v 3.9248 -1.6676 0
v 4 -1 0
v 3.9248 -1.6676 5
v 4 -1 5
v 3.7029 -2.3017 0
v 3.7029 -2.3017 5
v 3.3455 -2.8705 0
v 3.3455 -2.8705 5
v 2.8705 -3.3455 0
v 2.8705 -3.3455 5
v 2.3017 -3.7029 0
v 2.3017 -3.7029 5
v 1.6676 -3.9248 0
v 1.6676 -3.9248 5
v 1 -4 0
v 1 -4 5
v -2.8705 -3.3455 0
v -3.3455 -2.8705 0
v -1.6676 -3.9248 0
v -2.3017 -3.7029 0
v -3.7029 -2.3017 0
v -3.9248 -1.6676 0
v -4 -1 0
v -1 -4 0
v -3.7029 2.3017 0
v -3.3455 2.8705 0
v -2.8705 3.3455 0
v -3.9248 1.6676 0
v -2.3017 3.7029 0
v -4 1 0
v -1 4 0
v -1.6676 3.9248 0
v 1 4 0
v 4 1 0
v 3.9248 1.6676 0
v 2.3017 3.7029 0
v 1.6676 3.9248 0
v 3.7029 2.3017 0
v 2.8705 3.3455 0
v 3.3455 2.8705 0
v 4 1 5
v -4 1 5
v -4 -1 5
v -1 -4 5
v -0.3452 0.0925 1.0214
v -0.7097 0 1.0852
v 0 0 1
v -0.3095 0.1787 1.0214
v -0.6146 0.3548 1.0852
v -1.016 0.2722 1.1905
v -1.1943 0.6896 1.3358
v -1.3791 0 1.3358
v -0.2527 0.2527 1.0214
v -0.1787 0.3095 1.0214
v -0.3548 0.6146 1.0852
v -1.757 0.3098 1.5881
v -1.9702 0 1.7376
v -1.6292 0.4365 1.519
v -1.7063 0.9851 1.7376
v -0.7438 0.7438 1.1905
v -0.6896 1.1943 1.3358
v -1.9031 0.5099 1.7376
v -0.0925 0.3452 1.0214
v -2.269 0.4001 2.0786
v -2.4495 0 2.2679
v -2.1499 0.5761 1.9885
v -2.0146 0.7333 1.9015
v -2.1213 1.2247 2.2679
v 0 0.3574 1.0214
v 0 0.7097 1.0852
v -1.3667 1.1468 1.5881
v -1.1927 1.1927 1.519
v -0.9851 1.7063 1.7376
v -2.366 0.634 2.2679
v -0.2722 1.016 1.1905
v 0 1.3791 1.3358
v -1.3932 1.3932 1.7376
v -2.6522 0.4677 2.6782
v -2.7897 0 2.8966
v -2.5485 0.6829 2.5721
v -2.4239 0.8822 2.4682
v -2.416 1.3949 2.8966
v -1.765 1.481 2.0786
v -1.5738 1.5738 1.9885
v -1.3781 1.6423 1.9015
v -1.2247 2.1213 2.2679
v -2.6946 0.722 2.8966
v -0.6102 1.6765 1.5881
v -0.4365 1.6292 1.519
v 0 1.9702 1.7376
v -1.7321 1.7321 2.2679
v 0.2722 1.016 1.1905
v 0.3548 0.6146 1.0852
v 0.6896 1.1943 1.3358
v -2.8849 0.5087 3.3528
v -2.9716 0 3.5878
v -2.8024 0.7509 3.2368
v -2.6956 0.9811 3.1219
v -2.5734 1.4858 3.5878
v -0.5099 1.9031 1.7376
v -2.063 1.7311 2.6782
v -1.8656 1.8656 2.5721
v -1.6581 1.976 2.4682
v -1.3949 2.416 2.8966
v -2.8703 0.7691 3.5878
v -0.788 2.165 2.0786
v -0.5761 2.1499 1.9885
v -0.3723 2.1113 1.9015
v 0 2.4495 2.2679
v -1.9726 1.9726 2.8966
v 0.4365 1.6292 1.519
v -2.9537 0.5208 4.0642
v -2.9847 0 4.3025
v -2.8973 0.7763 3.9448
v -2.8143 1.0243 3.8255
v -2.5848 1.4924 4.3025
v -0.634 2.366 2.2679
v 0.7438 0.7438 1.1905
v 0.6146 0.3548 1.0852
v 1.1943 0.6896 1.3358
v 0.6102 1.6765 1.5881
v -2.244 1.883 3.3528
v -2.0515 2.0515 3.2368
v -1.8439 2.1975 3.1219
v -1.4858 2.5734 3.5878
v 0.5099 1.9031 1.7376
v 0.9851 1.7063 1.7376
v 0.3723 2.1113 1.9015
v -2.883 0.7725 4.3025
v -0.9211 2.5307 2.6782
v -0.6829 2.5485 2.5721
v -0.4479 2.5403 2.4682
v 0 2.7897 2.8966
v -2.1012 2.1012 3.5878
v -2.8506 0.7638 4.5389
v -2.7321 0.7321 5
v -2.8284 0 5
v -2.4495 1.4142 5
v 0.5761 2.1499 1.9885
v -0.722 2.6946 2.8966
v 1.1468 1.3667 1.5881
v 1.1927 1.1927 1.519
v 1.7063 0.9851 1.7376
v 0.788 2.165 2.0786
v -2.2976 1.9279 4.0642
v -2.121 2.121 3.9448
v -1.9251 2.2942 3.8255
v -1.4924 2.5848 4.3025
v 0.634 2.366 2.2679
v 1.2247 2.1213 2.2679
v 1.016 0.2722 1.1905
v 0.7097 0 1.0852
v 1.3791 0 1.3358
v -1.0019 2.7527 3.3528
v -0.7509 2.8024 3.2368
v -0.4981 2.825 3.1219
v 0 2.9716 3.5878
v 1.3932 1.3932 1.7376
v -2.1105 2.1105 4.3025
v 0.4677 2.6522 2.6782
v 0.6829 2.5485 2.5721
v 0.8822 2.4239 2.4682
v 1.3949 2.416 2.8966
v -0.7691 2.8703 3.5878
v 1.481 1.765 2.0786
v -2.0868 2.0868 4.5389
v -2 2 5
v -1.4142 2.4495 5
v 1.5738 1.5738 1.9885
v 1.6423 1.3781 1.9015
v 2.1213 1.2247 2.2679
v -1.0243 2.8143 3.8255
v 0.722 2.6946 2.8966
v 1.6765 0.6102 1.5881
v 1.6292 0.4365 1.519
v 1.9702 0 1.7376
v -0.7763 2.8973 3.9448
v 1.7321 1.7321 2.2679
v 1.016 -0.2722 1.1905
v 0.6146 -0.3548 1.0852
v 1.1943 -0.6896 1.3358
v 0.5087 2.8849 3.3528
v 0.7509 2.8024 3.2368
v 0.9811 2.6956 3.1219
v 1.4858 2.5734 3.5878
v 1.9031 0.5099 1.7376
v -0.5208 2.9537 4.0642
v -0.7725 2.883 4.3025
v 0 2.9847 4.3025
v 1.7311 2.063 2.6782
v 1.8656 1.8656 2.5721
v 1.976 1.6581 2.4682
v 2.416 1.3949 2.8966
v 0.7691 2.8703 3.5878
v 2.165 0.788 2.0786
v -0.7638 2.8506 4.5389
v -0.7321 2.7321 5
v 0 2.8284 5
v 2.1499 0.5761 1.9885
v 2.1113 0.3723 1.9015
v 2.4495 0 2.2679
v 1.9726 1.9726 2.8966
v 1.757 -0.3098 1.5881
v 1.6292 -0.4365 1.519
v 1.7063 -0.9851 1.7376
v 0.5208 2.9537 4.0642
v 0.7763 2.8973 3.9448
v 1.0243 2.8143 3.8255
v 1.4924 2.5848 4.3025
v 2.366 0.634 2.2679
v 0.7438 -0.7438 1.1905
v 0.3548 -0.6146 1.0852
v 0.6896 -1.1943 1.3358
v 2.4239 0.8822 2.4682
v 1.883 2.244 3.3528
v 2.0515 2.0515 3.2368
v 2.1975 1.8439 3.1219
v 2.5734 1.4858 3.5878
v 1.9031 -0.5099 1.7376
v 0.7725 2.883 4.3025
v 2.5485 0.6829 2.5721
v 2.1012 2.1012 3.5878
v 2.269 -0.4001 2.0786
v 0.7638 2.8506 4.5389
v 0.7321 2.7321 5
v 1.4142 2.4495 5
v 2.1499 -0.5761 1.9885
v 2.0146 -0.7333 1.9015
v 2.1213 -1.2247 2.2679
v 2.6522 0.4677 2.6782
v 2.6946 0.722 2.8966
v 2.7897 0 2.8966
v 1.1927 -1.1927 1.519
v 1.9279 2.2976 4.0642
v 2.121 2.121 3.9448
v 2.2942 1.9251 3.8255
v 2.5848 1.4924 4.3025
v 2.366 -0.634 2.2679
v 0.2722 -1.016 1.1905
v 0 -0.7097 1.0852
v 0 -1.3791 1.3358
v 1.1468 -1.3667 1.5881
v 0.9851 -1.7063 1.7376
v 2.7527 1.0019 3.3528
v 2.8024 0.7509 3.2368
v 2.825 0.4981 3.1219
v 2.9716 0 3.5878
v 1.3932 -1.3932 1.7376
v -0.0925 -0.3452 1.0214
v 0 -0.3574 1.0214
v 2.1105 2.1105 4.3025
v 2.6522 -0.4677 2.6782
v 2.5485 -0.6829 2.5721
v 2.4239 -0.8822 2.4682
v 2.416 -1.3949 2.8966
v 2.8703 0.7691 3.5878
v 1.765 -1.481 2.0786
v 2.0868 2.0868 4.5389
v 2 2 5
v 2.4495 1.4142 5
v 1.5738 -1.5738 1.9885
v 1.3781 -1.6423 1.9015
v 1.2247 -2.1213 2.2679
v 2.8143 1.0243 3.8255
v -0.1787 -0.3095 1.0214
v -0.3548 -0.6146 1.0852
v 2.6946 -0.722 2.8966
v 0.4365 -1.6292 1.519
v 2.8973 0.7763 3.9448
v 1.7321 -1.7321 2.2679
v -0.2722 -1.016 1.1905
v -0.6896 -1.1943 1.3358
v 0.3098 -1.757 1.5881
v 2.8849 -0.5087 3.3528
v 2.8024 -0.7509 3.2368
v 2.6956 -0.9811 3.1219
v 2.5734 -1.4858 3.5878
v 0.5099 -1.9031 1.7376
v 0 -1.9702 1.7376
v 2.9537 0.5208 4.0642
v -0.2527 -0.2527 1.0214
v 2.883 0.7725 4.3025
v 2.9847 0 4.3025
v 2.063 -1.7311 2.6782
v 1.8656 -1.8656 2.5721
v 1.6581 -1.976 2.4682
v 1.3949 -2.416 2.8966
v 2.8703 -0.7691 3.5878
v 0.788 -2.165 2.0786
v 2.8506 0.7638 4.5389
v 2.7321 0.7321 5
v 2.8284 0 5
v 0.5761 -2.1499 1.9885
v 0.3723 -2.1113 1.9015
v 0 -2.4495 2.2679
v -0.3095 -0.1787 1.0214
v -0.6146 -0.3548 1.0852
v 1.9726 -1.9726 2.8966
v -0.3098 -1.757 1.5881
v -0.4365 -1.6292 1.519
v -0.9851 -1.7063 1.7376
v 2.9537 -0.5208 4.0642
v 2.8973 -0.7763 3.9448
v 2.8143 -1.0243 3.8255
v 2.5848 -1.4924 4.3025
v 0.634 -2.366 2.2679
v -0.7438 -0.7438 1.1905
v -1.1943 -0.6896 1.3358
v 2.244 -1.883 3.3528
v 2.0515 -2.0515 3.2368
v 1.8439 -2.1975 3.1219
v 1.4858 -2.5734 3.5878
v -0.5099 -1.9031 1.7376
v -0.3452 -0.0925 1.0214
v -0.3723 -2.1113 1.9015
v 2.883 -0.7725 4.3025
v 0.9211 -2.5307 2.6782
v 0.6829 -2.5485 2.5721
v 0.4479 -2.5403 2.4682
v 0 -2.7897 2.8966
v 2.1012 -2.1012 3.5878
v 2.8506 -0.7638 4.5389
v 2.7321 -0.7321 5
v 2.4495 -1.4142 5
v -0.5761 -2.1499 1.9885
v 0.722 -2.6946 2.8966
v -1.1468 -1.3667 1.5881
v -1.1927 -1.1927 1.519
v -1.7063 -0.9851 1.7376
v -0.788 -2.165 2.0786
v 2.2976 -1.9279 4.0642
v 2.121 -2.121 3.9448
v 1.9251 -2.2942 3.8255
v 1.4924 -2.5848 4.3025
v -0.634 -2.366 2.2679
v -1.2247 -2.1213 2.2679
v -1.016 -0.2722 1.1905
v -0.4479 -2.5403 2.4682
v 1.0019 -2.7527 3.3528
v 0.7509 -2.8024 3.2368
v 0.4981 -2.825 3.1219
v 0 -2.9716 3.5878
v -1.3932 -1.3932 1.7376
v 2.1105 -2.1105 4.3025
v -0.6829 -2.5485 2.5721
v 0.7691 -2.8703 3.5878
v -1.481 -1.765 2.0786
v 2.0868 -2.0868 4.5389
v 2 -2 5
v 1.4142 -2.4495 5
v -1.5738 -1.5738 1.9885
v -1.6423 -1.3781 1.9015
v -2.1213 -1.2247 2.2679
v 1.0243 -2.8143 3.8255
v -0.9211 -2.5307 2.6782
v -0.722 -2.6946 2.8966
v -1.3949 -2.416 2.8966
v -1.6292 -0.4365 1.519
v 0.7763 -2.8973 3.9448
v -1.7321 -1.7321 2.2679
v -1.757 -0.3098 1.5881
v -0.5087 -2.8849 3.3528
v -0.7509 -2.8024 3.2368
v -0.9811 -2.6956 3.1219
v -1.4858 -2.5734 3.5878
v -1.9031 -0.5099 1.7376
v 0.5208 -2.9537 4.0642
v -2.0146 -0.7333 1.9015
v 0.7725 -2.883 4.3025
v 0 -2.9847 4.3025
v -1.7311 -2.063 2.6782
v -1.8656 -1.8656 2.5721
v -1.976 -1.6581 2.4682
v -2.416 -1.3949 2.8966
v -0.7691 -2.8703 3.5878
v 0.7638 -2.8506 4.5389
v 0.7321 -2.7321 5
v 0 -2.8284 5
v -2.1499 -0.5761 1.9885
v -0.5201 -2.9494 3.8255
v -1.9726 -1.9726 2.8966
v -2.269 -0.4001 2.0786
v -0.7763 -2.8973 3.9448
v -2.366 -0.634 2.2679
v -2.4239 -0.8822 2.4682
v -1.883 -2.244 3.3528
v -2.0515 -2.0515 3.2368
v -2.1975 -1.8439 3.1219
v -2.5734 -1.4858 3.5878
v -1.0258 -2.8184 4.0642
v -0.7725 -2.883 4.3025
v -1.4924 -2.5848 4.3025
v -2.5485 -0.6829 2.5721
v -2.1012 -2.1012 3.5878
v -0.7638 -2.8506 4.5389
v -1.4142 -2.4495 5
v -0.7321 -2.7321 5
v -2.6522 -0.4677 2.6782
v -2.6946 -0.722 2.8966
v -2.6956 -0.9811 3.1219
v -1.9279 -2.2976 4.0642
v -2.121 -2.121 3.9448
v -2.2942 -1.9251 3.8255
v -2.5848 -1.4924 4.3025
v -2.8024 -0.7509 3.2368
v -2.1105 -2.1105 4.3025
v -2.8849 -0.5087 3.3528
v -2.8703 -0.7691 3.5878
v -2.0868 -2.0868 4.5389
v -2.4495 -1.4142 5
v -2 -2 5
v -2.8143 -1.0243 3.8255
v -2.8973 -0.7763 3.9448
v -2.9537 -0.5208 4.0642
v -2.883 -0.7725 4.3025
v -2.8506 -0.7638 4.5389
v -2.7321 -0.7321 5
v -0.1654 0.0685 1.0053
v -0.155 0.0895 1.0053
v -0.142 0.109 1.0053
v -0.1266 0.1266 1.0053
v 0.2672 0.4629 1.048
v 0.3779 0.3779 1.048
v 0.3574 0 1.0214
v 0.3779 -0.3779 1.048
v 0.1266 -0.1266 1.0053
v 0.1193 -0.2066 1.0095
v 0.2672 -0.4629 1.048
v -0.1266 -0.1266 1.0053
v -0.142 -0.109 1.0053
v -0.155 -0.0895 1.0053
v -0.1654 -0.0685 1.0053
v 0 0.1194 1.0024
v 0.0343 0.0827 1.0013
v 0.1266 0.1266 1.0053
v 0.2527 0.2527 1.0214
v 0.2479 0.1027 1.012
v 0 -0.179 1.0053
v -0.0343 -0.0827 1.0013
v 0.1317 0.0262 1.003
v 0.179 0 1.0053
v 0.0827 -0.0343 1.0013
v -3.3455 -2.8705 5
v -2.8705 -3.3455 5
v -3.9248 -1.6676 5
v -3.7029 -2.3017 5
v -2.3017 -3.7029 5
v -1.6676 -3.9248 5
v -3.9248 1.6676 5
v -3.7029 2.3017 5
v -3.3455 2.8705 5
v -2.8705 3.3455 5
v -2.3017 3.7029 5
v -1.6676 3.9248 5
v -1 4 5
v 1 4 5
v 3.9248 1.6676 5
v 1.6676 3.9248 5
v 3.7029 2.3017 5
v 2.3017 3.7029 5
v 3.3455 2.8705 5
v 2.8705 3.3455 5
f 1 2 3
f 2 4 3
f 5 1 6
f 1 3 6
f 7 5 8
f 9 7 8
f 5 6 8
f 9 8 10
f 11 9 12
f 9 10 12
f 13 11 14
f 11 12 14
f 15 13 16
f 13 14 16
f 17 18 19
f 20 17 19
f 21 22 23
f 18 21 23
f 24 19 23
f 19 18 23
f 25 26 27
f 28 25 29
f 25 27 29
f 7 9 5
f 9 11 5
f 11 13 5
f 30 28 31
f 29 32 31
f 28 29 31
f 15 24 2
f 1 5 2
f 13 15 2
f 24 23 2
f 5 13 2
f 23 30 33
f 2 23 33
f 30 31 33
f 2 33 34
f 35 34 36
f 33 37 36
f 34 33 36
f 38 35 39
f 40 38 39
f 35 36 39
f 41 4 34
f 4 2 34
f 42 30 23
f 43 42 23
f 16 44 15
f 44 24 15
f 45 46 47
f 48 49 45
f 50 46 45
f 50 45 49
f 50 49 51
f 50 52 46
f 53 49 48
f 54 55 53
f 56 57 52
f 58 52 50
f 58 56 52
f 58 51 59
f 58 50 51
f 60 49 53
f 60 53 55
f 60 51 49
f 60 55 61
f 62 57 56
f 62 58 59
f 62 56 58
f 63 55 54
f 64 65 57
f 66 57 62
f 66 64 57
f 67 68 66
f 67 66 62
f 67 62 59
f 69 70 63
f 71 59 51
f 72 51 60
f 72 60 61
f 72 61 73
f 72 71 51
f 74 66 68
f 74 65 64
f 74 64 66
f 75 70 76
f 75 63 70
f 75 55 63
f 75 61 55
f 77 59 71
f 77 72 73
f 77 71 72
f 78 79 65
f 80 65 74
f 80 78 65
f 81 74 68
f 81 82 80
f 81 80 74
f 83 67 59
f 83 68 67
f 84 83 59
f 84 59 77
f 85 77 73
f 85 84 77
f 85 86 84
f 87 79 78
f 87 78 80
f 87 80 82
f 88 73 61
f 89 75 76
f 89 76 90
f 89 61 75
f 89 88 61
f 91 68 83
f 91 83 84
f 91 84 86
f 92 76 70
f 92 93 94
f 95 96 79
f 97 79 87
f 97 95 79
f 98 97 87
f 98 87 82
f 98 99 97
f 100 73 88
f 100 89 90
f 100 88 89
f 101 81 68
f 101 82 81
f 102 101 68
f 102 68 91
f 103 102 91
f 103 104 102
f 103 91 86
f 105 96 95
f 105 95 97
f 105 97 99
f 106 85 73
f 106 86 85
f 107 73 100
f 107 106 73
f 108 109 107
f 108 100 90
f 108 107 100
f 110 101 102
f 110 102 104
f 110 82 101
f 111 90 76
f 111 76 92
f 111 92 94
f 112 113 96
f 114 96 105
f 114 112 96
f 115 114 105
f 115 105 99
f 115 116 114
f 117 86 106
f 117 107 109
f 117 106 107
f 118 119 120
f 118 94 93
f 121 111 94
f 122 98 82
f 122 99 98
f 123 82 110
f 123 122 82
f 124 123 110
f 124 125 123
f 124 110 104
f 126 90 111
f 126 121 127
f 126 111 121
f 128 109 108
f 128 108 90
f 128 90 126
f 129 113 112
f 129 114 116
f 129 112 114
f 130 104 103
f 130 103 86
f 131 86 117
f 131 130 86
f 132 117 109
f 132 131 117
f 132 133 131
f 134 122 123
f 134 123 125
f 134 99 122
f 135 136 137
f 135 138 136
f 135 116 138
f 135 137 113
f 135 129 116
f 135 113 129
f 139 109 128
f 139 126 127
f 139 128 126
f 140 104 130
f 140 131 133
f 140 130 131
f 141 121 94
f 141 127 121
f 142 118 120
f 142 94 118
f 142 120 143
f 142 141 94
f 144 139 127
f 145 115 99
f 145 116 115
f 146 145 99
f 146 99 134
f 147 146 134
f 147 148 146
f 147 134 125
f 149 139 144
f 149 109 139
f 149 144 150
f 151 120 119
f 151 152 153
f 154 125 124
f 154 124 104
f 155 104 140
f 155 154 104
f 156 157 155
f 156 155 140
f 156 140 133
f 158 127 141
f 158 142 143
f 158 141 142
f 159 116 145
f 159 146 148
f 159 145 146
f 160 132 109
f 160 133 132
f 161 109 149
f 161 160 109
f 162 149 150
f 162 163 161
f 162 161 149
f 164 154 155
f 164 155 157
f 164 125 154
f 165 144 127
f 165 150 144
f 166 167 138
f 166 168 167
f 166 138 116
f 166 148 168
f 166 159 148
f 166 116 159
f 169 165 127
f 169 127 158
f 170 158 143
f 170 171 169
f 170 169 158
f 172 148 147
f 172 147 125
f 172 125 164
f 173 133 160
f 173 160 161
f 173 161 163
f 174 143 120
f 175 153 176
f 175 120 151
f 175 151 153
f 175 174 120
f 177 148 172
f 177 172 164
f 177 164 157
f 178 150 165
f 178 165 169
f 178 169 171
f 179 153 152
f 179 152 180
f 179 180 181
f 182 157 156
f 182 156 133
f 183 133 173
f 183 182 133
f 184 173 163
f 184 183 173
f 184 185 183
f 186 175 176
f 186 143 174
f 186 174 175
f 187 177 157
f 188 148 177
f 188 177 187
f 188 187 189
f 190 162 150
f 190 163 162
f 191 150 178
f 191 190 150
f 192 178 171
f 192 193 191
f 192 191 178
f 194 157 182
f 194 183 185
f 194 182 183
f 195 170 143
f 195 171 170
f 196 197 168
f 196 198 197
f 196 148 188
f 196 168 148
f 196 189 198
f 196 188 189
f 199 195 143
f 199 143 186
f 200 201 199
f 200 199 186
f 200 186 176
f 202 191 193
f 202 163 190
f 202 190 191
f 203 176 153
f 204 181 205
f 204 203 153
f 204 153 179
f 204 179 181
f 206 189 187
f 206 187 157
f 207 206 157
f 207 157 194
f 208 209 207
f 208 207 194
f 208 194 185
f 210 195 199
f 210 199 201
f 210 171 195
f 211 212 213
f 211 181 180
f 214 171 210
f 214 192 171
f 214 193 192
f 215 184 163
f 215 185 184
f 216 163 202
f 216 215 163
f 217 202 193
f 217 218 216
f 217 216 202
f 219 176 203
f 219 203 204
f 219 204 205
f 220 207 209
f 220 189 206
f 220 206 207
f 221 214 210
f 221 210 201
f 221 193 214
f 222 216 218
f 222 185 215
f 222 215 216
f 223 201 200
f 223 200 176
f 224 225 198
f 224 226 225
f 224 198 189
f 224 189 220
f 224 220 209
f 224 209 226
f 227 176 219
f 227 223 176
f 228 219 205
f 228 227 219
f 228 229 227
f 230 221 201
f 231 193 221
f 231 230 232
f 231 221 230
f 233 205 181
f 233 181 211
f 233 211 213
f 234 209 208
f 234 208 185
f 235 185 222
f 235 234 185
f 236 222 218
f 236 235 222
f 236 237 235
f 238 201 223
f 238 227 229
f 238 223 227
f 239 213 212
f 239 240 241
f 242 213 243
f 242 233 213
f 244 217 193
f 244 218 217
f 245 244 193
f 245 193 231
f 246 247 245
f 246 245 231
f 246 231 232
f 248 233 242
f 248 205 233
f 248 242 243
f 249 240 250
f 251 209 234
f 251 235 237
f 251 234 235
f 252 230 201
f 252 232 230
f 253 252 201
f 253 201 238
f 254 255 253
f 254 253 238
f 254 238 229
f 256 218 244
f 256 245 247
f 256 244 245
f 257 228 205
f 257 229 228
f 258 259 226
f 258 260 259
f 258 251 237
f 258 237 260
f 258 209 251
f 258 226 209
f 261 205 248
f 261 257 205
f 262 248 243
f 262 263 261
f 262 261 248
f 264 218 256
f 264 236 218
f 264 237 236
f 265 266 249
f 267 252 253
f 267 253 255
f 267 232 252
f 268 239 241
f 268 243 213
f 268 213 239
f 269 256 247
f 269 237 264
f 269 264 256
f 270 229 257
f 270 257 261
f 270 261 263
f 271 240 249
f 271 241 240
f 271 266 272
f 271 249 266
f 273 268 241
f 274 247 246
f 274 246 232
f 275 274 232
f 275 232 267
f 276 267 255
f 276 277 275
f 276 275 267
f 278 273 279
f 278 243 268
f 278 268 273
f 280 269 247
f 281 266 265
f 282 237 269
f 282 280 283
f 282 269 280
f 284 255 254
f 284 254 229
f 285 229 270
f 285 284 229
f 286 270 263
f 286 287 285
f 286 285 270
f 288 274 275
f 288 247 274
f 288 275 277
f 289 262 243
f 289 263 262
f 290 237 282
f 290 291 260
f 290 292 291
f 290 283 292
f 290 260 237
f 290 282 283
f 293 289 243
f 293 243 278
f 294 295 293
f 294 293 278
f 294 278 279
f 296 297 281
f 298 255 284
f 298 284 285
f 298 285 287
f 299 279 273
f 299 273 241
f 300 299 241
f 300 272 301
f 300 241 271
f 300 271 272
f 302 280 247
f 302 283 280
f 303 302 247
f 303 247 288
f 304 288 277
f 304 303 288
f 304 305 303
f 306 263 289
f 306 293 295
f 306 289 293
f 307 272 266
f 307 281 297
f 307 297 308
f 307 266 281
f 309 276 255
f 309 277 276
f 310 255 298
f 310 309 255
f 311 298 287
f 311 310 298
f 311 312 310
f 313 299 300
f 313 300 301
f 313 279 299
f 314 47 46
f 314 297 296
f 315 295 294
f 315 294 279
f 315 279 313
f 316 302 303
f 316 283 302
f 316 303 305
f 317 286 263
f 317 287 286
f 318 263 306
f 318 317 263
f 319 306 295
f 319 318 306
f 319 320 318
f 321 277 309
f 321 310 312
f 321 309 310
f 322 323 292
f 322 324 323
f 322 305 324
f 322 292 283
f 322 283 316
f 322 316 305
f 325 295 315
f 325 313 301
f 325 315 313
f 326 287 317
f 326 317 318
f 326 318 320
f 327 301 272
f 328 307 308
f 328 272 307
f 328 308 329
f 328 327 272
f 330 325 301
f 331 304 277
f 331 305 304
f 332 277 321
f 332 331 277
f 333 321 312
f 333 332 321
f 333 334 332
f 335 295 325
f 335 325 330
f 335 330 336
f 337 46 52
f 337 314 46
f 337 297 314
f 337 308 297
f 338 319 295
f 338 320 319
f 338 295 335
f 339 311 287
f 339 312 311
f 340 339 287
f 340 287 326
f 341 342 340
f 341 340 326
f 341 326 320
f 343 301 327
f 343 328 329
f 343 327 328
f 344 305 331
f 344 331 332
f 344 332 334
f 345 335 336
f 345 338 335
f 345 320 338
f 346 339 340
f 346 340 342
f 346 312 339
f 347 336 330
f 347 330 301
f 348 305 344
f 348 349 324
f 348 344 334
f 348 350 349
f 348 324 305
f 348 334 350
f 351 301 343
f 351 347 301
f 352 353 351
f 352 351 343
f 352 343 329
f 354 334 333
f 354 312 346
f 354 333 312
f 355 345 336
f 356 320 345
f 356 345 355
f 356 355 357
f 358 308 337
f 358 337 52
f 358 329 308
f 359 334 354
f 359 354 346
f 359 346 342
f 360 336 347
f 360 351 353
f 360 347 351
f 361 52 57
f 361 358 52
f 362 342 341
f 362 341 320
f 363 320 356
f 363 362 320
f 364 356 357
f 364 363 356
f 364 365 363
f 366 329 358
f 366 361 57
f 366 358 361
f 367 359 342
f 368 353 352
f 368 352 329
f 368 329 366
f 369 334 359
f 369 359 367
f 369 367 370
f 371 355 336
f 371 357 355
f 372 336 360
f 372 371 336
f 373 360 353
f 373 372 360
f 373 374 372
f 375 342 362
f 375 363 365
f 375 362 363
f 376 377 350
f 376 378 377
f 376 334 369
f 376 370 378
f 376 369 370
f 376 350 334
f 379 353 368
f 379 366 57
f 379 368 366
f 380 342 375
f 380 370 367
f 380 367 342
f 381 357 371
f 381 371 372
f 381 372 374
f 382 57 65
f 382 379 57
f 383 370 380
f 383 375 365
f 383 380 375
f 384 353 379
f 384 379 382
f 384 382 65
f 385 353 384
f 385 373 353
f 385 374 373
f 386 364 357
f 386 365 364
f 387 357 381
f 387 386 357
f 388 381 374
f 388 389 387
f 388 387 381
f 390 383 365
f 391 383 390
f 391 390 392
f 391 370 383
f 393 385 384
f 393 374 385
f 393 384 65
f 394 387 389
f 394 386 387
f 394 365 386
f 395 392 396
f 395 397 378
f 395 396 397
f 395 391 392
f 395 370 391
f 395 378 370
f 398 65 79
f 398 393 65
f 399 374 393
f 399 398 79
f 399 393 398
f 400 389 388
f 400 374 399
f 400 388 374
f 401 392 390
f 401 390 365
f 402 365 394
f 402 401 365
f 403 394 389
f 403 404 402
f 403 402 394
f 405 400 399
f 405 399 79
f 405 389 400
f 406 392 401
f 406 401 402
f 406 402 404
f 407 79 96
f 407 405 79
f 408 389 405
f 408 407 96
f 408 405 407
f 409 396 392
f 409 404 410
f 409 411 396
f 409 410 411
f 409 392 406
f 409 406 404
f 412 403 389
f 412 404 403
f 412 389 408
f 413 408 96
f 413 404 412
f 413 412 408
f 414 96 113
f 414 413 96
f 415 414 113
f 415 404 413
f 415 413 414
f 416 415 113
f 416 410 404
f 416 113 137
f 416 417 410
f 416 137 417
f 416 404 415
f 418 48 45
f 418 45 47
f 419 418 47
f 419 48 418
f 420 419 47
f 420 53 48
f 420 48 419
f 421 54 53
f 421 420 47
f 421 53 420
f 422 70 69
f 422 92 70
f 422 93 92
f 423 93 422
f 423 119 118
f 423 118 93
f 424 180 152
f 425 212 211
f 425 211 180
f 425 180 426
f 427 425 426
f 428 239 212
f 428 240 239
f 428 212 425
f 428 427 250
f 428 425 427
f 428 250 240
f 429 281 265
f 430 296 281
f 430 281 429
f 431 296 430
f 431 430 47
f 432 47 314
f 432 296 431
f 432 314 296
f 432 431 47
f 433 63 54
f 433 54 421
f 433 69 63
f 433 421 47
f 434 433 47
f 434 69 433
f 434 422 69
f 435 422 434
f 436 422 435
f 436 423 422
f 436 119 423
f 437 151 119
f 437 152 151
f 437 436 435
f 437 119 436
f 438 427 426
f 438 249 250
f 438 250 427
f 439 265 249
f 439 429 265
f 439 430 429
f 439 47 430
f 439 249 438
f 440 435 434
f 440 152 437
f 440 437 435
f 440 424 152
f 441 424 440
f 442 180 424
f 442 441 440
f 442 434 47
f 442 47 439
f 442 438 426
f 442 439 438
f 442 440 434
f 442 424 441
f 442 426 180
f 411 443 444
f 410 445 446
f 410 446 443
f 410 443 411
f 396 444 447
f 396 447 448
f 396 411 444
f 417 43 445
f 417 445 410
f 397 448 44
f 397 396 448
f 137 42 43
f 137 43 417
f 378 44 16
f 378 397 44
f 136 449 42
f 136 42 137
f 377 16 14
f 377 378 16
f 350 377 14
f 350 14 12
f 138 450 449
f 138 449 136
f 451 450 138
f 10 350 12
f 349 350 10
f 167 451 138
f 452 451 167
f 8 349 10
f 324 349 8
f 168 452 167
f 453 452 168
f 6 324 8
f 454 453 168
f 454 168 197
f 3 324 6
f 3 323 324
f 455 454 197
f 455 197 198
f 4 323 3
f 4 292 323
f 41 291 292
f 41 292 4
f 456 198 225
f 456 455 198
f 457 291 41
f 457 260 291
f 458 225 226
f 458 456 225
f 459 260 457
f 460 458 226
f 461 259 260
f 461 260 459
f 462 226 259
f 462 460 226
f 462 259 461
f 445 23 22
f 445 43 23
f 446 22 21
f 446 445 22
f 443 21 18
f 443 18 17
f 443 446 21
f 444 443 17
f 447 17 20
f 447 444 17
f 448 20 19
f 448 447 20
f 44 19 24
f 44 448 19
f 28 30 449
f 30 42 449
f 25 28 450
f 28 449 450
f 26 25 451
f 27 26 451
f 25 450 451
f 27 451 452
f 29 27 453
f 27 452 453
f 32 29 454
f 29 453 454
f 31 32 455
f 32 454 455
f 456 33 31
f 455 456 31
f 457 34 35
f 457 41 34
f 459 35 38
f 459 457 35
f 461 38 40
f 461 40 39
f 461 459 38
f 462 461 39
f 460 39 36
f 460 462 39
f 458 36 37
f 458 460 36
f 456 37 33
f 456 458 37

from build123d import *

# Parameters (mm, degrees)
F4_DEPTH = 5
F5_R     = 3


with BuildPart() as f2:
    # F1 (on Front) → F2 (revolve)
    with BuildSketch(Plane.XZ):
        with BuildLine():
            ThreePointArc((0, 1), (-2.44949, 2.267949), (-2.828427, 5))
            Line((-2.828427, 5), (-4, 5))
            Line((-4, 5), (-4, 0))
            Line((-4, 0), (0, 0))
            Line((0, 0), (0, 1))
        make_face()
    revolve(axis=Axis((0, 0, -0.010433), (0, 0, -1)))

    # F3 (on Top) → F4 (join)
    with BuildSketch(Plane.XY):
        with BuildLine():
            ThreePointArc((0, -4), (-2.828427, -2.828427), (-4, 0))
            Line((-4, 0), (-4, -4))
            Line((-4, -4), (0, -4))
        make_face()
        with BuildLine():
            Line((4, -4), (4, 0))
            ThreePointArc((4, 0), (2.828427, -2.828427), (0, -4))
            Line((0, -4), (4, -4))
        make_face()
        with BuildLine():
            Line((4, 4), (0, 4))
            ThreePointArc((0, 4), (2.828427, 2.828427), (4, 0))
            Line((4, 0), (4, 4))
        make_face()
        with BuildLine():
            Line((0, 4), (-4, 4))
            Line((-4, 4), (-4, 0))
            ThreePointArc((-4, 0), (-2.828427, 2.828427), (0, 4))
        make_face()
    extrude(amount=F4_DEPTH)

    # F5
    f5_edges = [f2.edges().sort_by_distance(p)[0] for p in [
        (4, -4, 2.5),
        (4, 4, 2.5),
        (-4, -4, 2.5),
        (-4, 4, 2.5),
    ]]
    fillet(f5_edges, radius=F5_R)


solid = f2.part
